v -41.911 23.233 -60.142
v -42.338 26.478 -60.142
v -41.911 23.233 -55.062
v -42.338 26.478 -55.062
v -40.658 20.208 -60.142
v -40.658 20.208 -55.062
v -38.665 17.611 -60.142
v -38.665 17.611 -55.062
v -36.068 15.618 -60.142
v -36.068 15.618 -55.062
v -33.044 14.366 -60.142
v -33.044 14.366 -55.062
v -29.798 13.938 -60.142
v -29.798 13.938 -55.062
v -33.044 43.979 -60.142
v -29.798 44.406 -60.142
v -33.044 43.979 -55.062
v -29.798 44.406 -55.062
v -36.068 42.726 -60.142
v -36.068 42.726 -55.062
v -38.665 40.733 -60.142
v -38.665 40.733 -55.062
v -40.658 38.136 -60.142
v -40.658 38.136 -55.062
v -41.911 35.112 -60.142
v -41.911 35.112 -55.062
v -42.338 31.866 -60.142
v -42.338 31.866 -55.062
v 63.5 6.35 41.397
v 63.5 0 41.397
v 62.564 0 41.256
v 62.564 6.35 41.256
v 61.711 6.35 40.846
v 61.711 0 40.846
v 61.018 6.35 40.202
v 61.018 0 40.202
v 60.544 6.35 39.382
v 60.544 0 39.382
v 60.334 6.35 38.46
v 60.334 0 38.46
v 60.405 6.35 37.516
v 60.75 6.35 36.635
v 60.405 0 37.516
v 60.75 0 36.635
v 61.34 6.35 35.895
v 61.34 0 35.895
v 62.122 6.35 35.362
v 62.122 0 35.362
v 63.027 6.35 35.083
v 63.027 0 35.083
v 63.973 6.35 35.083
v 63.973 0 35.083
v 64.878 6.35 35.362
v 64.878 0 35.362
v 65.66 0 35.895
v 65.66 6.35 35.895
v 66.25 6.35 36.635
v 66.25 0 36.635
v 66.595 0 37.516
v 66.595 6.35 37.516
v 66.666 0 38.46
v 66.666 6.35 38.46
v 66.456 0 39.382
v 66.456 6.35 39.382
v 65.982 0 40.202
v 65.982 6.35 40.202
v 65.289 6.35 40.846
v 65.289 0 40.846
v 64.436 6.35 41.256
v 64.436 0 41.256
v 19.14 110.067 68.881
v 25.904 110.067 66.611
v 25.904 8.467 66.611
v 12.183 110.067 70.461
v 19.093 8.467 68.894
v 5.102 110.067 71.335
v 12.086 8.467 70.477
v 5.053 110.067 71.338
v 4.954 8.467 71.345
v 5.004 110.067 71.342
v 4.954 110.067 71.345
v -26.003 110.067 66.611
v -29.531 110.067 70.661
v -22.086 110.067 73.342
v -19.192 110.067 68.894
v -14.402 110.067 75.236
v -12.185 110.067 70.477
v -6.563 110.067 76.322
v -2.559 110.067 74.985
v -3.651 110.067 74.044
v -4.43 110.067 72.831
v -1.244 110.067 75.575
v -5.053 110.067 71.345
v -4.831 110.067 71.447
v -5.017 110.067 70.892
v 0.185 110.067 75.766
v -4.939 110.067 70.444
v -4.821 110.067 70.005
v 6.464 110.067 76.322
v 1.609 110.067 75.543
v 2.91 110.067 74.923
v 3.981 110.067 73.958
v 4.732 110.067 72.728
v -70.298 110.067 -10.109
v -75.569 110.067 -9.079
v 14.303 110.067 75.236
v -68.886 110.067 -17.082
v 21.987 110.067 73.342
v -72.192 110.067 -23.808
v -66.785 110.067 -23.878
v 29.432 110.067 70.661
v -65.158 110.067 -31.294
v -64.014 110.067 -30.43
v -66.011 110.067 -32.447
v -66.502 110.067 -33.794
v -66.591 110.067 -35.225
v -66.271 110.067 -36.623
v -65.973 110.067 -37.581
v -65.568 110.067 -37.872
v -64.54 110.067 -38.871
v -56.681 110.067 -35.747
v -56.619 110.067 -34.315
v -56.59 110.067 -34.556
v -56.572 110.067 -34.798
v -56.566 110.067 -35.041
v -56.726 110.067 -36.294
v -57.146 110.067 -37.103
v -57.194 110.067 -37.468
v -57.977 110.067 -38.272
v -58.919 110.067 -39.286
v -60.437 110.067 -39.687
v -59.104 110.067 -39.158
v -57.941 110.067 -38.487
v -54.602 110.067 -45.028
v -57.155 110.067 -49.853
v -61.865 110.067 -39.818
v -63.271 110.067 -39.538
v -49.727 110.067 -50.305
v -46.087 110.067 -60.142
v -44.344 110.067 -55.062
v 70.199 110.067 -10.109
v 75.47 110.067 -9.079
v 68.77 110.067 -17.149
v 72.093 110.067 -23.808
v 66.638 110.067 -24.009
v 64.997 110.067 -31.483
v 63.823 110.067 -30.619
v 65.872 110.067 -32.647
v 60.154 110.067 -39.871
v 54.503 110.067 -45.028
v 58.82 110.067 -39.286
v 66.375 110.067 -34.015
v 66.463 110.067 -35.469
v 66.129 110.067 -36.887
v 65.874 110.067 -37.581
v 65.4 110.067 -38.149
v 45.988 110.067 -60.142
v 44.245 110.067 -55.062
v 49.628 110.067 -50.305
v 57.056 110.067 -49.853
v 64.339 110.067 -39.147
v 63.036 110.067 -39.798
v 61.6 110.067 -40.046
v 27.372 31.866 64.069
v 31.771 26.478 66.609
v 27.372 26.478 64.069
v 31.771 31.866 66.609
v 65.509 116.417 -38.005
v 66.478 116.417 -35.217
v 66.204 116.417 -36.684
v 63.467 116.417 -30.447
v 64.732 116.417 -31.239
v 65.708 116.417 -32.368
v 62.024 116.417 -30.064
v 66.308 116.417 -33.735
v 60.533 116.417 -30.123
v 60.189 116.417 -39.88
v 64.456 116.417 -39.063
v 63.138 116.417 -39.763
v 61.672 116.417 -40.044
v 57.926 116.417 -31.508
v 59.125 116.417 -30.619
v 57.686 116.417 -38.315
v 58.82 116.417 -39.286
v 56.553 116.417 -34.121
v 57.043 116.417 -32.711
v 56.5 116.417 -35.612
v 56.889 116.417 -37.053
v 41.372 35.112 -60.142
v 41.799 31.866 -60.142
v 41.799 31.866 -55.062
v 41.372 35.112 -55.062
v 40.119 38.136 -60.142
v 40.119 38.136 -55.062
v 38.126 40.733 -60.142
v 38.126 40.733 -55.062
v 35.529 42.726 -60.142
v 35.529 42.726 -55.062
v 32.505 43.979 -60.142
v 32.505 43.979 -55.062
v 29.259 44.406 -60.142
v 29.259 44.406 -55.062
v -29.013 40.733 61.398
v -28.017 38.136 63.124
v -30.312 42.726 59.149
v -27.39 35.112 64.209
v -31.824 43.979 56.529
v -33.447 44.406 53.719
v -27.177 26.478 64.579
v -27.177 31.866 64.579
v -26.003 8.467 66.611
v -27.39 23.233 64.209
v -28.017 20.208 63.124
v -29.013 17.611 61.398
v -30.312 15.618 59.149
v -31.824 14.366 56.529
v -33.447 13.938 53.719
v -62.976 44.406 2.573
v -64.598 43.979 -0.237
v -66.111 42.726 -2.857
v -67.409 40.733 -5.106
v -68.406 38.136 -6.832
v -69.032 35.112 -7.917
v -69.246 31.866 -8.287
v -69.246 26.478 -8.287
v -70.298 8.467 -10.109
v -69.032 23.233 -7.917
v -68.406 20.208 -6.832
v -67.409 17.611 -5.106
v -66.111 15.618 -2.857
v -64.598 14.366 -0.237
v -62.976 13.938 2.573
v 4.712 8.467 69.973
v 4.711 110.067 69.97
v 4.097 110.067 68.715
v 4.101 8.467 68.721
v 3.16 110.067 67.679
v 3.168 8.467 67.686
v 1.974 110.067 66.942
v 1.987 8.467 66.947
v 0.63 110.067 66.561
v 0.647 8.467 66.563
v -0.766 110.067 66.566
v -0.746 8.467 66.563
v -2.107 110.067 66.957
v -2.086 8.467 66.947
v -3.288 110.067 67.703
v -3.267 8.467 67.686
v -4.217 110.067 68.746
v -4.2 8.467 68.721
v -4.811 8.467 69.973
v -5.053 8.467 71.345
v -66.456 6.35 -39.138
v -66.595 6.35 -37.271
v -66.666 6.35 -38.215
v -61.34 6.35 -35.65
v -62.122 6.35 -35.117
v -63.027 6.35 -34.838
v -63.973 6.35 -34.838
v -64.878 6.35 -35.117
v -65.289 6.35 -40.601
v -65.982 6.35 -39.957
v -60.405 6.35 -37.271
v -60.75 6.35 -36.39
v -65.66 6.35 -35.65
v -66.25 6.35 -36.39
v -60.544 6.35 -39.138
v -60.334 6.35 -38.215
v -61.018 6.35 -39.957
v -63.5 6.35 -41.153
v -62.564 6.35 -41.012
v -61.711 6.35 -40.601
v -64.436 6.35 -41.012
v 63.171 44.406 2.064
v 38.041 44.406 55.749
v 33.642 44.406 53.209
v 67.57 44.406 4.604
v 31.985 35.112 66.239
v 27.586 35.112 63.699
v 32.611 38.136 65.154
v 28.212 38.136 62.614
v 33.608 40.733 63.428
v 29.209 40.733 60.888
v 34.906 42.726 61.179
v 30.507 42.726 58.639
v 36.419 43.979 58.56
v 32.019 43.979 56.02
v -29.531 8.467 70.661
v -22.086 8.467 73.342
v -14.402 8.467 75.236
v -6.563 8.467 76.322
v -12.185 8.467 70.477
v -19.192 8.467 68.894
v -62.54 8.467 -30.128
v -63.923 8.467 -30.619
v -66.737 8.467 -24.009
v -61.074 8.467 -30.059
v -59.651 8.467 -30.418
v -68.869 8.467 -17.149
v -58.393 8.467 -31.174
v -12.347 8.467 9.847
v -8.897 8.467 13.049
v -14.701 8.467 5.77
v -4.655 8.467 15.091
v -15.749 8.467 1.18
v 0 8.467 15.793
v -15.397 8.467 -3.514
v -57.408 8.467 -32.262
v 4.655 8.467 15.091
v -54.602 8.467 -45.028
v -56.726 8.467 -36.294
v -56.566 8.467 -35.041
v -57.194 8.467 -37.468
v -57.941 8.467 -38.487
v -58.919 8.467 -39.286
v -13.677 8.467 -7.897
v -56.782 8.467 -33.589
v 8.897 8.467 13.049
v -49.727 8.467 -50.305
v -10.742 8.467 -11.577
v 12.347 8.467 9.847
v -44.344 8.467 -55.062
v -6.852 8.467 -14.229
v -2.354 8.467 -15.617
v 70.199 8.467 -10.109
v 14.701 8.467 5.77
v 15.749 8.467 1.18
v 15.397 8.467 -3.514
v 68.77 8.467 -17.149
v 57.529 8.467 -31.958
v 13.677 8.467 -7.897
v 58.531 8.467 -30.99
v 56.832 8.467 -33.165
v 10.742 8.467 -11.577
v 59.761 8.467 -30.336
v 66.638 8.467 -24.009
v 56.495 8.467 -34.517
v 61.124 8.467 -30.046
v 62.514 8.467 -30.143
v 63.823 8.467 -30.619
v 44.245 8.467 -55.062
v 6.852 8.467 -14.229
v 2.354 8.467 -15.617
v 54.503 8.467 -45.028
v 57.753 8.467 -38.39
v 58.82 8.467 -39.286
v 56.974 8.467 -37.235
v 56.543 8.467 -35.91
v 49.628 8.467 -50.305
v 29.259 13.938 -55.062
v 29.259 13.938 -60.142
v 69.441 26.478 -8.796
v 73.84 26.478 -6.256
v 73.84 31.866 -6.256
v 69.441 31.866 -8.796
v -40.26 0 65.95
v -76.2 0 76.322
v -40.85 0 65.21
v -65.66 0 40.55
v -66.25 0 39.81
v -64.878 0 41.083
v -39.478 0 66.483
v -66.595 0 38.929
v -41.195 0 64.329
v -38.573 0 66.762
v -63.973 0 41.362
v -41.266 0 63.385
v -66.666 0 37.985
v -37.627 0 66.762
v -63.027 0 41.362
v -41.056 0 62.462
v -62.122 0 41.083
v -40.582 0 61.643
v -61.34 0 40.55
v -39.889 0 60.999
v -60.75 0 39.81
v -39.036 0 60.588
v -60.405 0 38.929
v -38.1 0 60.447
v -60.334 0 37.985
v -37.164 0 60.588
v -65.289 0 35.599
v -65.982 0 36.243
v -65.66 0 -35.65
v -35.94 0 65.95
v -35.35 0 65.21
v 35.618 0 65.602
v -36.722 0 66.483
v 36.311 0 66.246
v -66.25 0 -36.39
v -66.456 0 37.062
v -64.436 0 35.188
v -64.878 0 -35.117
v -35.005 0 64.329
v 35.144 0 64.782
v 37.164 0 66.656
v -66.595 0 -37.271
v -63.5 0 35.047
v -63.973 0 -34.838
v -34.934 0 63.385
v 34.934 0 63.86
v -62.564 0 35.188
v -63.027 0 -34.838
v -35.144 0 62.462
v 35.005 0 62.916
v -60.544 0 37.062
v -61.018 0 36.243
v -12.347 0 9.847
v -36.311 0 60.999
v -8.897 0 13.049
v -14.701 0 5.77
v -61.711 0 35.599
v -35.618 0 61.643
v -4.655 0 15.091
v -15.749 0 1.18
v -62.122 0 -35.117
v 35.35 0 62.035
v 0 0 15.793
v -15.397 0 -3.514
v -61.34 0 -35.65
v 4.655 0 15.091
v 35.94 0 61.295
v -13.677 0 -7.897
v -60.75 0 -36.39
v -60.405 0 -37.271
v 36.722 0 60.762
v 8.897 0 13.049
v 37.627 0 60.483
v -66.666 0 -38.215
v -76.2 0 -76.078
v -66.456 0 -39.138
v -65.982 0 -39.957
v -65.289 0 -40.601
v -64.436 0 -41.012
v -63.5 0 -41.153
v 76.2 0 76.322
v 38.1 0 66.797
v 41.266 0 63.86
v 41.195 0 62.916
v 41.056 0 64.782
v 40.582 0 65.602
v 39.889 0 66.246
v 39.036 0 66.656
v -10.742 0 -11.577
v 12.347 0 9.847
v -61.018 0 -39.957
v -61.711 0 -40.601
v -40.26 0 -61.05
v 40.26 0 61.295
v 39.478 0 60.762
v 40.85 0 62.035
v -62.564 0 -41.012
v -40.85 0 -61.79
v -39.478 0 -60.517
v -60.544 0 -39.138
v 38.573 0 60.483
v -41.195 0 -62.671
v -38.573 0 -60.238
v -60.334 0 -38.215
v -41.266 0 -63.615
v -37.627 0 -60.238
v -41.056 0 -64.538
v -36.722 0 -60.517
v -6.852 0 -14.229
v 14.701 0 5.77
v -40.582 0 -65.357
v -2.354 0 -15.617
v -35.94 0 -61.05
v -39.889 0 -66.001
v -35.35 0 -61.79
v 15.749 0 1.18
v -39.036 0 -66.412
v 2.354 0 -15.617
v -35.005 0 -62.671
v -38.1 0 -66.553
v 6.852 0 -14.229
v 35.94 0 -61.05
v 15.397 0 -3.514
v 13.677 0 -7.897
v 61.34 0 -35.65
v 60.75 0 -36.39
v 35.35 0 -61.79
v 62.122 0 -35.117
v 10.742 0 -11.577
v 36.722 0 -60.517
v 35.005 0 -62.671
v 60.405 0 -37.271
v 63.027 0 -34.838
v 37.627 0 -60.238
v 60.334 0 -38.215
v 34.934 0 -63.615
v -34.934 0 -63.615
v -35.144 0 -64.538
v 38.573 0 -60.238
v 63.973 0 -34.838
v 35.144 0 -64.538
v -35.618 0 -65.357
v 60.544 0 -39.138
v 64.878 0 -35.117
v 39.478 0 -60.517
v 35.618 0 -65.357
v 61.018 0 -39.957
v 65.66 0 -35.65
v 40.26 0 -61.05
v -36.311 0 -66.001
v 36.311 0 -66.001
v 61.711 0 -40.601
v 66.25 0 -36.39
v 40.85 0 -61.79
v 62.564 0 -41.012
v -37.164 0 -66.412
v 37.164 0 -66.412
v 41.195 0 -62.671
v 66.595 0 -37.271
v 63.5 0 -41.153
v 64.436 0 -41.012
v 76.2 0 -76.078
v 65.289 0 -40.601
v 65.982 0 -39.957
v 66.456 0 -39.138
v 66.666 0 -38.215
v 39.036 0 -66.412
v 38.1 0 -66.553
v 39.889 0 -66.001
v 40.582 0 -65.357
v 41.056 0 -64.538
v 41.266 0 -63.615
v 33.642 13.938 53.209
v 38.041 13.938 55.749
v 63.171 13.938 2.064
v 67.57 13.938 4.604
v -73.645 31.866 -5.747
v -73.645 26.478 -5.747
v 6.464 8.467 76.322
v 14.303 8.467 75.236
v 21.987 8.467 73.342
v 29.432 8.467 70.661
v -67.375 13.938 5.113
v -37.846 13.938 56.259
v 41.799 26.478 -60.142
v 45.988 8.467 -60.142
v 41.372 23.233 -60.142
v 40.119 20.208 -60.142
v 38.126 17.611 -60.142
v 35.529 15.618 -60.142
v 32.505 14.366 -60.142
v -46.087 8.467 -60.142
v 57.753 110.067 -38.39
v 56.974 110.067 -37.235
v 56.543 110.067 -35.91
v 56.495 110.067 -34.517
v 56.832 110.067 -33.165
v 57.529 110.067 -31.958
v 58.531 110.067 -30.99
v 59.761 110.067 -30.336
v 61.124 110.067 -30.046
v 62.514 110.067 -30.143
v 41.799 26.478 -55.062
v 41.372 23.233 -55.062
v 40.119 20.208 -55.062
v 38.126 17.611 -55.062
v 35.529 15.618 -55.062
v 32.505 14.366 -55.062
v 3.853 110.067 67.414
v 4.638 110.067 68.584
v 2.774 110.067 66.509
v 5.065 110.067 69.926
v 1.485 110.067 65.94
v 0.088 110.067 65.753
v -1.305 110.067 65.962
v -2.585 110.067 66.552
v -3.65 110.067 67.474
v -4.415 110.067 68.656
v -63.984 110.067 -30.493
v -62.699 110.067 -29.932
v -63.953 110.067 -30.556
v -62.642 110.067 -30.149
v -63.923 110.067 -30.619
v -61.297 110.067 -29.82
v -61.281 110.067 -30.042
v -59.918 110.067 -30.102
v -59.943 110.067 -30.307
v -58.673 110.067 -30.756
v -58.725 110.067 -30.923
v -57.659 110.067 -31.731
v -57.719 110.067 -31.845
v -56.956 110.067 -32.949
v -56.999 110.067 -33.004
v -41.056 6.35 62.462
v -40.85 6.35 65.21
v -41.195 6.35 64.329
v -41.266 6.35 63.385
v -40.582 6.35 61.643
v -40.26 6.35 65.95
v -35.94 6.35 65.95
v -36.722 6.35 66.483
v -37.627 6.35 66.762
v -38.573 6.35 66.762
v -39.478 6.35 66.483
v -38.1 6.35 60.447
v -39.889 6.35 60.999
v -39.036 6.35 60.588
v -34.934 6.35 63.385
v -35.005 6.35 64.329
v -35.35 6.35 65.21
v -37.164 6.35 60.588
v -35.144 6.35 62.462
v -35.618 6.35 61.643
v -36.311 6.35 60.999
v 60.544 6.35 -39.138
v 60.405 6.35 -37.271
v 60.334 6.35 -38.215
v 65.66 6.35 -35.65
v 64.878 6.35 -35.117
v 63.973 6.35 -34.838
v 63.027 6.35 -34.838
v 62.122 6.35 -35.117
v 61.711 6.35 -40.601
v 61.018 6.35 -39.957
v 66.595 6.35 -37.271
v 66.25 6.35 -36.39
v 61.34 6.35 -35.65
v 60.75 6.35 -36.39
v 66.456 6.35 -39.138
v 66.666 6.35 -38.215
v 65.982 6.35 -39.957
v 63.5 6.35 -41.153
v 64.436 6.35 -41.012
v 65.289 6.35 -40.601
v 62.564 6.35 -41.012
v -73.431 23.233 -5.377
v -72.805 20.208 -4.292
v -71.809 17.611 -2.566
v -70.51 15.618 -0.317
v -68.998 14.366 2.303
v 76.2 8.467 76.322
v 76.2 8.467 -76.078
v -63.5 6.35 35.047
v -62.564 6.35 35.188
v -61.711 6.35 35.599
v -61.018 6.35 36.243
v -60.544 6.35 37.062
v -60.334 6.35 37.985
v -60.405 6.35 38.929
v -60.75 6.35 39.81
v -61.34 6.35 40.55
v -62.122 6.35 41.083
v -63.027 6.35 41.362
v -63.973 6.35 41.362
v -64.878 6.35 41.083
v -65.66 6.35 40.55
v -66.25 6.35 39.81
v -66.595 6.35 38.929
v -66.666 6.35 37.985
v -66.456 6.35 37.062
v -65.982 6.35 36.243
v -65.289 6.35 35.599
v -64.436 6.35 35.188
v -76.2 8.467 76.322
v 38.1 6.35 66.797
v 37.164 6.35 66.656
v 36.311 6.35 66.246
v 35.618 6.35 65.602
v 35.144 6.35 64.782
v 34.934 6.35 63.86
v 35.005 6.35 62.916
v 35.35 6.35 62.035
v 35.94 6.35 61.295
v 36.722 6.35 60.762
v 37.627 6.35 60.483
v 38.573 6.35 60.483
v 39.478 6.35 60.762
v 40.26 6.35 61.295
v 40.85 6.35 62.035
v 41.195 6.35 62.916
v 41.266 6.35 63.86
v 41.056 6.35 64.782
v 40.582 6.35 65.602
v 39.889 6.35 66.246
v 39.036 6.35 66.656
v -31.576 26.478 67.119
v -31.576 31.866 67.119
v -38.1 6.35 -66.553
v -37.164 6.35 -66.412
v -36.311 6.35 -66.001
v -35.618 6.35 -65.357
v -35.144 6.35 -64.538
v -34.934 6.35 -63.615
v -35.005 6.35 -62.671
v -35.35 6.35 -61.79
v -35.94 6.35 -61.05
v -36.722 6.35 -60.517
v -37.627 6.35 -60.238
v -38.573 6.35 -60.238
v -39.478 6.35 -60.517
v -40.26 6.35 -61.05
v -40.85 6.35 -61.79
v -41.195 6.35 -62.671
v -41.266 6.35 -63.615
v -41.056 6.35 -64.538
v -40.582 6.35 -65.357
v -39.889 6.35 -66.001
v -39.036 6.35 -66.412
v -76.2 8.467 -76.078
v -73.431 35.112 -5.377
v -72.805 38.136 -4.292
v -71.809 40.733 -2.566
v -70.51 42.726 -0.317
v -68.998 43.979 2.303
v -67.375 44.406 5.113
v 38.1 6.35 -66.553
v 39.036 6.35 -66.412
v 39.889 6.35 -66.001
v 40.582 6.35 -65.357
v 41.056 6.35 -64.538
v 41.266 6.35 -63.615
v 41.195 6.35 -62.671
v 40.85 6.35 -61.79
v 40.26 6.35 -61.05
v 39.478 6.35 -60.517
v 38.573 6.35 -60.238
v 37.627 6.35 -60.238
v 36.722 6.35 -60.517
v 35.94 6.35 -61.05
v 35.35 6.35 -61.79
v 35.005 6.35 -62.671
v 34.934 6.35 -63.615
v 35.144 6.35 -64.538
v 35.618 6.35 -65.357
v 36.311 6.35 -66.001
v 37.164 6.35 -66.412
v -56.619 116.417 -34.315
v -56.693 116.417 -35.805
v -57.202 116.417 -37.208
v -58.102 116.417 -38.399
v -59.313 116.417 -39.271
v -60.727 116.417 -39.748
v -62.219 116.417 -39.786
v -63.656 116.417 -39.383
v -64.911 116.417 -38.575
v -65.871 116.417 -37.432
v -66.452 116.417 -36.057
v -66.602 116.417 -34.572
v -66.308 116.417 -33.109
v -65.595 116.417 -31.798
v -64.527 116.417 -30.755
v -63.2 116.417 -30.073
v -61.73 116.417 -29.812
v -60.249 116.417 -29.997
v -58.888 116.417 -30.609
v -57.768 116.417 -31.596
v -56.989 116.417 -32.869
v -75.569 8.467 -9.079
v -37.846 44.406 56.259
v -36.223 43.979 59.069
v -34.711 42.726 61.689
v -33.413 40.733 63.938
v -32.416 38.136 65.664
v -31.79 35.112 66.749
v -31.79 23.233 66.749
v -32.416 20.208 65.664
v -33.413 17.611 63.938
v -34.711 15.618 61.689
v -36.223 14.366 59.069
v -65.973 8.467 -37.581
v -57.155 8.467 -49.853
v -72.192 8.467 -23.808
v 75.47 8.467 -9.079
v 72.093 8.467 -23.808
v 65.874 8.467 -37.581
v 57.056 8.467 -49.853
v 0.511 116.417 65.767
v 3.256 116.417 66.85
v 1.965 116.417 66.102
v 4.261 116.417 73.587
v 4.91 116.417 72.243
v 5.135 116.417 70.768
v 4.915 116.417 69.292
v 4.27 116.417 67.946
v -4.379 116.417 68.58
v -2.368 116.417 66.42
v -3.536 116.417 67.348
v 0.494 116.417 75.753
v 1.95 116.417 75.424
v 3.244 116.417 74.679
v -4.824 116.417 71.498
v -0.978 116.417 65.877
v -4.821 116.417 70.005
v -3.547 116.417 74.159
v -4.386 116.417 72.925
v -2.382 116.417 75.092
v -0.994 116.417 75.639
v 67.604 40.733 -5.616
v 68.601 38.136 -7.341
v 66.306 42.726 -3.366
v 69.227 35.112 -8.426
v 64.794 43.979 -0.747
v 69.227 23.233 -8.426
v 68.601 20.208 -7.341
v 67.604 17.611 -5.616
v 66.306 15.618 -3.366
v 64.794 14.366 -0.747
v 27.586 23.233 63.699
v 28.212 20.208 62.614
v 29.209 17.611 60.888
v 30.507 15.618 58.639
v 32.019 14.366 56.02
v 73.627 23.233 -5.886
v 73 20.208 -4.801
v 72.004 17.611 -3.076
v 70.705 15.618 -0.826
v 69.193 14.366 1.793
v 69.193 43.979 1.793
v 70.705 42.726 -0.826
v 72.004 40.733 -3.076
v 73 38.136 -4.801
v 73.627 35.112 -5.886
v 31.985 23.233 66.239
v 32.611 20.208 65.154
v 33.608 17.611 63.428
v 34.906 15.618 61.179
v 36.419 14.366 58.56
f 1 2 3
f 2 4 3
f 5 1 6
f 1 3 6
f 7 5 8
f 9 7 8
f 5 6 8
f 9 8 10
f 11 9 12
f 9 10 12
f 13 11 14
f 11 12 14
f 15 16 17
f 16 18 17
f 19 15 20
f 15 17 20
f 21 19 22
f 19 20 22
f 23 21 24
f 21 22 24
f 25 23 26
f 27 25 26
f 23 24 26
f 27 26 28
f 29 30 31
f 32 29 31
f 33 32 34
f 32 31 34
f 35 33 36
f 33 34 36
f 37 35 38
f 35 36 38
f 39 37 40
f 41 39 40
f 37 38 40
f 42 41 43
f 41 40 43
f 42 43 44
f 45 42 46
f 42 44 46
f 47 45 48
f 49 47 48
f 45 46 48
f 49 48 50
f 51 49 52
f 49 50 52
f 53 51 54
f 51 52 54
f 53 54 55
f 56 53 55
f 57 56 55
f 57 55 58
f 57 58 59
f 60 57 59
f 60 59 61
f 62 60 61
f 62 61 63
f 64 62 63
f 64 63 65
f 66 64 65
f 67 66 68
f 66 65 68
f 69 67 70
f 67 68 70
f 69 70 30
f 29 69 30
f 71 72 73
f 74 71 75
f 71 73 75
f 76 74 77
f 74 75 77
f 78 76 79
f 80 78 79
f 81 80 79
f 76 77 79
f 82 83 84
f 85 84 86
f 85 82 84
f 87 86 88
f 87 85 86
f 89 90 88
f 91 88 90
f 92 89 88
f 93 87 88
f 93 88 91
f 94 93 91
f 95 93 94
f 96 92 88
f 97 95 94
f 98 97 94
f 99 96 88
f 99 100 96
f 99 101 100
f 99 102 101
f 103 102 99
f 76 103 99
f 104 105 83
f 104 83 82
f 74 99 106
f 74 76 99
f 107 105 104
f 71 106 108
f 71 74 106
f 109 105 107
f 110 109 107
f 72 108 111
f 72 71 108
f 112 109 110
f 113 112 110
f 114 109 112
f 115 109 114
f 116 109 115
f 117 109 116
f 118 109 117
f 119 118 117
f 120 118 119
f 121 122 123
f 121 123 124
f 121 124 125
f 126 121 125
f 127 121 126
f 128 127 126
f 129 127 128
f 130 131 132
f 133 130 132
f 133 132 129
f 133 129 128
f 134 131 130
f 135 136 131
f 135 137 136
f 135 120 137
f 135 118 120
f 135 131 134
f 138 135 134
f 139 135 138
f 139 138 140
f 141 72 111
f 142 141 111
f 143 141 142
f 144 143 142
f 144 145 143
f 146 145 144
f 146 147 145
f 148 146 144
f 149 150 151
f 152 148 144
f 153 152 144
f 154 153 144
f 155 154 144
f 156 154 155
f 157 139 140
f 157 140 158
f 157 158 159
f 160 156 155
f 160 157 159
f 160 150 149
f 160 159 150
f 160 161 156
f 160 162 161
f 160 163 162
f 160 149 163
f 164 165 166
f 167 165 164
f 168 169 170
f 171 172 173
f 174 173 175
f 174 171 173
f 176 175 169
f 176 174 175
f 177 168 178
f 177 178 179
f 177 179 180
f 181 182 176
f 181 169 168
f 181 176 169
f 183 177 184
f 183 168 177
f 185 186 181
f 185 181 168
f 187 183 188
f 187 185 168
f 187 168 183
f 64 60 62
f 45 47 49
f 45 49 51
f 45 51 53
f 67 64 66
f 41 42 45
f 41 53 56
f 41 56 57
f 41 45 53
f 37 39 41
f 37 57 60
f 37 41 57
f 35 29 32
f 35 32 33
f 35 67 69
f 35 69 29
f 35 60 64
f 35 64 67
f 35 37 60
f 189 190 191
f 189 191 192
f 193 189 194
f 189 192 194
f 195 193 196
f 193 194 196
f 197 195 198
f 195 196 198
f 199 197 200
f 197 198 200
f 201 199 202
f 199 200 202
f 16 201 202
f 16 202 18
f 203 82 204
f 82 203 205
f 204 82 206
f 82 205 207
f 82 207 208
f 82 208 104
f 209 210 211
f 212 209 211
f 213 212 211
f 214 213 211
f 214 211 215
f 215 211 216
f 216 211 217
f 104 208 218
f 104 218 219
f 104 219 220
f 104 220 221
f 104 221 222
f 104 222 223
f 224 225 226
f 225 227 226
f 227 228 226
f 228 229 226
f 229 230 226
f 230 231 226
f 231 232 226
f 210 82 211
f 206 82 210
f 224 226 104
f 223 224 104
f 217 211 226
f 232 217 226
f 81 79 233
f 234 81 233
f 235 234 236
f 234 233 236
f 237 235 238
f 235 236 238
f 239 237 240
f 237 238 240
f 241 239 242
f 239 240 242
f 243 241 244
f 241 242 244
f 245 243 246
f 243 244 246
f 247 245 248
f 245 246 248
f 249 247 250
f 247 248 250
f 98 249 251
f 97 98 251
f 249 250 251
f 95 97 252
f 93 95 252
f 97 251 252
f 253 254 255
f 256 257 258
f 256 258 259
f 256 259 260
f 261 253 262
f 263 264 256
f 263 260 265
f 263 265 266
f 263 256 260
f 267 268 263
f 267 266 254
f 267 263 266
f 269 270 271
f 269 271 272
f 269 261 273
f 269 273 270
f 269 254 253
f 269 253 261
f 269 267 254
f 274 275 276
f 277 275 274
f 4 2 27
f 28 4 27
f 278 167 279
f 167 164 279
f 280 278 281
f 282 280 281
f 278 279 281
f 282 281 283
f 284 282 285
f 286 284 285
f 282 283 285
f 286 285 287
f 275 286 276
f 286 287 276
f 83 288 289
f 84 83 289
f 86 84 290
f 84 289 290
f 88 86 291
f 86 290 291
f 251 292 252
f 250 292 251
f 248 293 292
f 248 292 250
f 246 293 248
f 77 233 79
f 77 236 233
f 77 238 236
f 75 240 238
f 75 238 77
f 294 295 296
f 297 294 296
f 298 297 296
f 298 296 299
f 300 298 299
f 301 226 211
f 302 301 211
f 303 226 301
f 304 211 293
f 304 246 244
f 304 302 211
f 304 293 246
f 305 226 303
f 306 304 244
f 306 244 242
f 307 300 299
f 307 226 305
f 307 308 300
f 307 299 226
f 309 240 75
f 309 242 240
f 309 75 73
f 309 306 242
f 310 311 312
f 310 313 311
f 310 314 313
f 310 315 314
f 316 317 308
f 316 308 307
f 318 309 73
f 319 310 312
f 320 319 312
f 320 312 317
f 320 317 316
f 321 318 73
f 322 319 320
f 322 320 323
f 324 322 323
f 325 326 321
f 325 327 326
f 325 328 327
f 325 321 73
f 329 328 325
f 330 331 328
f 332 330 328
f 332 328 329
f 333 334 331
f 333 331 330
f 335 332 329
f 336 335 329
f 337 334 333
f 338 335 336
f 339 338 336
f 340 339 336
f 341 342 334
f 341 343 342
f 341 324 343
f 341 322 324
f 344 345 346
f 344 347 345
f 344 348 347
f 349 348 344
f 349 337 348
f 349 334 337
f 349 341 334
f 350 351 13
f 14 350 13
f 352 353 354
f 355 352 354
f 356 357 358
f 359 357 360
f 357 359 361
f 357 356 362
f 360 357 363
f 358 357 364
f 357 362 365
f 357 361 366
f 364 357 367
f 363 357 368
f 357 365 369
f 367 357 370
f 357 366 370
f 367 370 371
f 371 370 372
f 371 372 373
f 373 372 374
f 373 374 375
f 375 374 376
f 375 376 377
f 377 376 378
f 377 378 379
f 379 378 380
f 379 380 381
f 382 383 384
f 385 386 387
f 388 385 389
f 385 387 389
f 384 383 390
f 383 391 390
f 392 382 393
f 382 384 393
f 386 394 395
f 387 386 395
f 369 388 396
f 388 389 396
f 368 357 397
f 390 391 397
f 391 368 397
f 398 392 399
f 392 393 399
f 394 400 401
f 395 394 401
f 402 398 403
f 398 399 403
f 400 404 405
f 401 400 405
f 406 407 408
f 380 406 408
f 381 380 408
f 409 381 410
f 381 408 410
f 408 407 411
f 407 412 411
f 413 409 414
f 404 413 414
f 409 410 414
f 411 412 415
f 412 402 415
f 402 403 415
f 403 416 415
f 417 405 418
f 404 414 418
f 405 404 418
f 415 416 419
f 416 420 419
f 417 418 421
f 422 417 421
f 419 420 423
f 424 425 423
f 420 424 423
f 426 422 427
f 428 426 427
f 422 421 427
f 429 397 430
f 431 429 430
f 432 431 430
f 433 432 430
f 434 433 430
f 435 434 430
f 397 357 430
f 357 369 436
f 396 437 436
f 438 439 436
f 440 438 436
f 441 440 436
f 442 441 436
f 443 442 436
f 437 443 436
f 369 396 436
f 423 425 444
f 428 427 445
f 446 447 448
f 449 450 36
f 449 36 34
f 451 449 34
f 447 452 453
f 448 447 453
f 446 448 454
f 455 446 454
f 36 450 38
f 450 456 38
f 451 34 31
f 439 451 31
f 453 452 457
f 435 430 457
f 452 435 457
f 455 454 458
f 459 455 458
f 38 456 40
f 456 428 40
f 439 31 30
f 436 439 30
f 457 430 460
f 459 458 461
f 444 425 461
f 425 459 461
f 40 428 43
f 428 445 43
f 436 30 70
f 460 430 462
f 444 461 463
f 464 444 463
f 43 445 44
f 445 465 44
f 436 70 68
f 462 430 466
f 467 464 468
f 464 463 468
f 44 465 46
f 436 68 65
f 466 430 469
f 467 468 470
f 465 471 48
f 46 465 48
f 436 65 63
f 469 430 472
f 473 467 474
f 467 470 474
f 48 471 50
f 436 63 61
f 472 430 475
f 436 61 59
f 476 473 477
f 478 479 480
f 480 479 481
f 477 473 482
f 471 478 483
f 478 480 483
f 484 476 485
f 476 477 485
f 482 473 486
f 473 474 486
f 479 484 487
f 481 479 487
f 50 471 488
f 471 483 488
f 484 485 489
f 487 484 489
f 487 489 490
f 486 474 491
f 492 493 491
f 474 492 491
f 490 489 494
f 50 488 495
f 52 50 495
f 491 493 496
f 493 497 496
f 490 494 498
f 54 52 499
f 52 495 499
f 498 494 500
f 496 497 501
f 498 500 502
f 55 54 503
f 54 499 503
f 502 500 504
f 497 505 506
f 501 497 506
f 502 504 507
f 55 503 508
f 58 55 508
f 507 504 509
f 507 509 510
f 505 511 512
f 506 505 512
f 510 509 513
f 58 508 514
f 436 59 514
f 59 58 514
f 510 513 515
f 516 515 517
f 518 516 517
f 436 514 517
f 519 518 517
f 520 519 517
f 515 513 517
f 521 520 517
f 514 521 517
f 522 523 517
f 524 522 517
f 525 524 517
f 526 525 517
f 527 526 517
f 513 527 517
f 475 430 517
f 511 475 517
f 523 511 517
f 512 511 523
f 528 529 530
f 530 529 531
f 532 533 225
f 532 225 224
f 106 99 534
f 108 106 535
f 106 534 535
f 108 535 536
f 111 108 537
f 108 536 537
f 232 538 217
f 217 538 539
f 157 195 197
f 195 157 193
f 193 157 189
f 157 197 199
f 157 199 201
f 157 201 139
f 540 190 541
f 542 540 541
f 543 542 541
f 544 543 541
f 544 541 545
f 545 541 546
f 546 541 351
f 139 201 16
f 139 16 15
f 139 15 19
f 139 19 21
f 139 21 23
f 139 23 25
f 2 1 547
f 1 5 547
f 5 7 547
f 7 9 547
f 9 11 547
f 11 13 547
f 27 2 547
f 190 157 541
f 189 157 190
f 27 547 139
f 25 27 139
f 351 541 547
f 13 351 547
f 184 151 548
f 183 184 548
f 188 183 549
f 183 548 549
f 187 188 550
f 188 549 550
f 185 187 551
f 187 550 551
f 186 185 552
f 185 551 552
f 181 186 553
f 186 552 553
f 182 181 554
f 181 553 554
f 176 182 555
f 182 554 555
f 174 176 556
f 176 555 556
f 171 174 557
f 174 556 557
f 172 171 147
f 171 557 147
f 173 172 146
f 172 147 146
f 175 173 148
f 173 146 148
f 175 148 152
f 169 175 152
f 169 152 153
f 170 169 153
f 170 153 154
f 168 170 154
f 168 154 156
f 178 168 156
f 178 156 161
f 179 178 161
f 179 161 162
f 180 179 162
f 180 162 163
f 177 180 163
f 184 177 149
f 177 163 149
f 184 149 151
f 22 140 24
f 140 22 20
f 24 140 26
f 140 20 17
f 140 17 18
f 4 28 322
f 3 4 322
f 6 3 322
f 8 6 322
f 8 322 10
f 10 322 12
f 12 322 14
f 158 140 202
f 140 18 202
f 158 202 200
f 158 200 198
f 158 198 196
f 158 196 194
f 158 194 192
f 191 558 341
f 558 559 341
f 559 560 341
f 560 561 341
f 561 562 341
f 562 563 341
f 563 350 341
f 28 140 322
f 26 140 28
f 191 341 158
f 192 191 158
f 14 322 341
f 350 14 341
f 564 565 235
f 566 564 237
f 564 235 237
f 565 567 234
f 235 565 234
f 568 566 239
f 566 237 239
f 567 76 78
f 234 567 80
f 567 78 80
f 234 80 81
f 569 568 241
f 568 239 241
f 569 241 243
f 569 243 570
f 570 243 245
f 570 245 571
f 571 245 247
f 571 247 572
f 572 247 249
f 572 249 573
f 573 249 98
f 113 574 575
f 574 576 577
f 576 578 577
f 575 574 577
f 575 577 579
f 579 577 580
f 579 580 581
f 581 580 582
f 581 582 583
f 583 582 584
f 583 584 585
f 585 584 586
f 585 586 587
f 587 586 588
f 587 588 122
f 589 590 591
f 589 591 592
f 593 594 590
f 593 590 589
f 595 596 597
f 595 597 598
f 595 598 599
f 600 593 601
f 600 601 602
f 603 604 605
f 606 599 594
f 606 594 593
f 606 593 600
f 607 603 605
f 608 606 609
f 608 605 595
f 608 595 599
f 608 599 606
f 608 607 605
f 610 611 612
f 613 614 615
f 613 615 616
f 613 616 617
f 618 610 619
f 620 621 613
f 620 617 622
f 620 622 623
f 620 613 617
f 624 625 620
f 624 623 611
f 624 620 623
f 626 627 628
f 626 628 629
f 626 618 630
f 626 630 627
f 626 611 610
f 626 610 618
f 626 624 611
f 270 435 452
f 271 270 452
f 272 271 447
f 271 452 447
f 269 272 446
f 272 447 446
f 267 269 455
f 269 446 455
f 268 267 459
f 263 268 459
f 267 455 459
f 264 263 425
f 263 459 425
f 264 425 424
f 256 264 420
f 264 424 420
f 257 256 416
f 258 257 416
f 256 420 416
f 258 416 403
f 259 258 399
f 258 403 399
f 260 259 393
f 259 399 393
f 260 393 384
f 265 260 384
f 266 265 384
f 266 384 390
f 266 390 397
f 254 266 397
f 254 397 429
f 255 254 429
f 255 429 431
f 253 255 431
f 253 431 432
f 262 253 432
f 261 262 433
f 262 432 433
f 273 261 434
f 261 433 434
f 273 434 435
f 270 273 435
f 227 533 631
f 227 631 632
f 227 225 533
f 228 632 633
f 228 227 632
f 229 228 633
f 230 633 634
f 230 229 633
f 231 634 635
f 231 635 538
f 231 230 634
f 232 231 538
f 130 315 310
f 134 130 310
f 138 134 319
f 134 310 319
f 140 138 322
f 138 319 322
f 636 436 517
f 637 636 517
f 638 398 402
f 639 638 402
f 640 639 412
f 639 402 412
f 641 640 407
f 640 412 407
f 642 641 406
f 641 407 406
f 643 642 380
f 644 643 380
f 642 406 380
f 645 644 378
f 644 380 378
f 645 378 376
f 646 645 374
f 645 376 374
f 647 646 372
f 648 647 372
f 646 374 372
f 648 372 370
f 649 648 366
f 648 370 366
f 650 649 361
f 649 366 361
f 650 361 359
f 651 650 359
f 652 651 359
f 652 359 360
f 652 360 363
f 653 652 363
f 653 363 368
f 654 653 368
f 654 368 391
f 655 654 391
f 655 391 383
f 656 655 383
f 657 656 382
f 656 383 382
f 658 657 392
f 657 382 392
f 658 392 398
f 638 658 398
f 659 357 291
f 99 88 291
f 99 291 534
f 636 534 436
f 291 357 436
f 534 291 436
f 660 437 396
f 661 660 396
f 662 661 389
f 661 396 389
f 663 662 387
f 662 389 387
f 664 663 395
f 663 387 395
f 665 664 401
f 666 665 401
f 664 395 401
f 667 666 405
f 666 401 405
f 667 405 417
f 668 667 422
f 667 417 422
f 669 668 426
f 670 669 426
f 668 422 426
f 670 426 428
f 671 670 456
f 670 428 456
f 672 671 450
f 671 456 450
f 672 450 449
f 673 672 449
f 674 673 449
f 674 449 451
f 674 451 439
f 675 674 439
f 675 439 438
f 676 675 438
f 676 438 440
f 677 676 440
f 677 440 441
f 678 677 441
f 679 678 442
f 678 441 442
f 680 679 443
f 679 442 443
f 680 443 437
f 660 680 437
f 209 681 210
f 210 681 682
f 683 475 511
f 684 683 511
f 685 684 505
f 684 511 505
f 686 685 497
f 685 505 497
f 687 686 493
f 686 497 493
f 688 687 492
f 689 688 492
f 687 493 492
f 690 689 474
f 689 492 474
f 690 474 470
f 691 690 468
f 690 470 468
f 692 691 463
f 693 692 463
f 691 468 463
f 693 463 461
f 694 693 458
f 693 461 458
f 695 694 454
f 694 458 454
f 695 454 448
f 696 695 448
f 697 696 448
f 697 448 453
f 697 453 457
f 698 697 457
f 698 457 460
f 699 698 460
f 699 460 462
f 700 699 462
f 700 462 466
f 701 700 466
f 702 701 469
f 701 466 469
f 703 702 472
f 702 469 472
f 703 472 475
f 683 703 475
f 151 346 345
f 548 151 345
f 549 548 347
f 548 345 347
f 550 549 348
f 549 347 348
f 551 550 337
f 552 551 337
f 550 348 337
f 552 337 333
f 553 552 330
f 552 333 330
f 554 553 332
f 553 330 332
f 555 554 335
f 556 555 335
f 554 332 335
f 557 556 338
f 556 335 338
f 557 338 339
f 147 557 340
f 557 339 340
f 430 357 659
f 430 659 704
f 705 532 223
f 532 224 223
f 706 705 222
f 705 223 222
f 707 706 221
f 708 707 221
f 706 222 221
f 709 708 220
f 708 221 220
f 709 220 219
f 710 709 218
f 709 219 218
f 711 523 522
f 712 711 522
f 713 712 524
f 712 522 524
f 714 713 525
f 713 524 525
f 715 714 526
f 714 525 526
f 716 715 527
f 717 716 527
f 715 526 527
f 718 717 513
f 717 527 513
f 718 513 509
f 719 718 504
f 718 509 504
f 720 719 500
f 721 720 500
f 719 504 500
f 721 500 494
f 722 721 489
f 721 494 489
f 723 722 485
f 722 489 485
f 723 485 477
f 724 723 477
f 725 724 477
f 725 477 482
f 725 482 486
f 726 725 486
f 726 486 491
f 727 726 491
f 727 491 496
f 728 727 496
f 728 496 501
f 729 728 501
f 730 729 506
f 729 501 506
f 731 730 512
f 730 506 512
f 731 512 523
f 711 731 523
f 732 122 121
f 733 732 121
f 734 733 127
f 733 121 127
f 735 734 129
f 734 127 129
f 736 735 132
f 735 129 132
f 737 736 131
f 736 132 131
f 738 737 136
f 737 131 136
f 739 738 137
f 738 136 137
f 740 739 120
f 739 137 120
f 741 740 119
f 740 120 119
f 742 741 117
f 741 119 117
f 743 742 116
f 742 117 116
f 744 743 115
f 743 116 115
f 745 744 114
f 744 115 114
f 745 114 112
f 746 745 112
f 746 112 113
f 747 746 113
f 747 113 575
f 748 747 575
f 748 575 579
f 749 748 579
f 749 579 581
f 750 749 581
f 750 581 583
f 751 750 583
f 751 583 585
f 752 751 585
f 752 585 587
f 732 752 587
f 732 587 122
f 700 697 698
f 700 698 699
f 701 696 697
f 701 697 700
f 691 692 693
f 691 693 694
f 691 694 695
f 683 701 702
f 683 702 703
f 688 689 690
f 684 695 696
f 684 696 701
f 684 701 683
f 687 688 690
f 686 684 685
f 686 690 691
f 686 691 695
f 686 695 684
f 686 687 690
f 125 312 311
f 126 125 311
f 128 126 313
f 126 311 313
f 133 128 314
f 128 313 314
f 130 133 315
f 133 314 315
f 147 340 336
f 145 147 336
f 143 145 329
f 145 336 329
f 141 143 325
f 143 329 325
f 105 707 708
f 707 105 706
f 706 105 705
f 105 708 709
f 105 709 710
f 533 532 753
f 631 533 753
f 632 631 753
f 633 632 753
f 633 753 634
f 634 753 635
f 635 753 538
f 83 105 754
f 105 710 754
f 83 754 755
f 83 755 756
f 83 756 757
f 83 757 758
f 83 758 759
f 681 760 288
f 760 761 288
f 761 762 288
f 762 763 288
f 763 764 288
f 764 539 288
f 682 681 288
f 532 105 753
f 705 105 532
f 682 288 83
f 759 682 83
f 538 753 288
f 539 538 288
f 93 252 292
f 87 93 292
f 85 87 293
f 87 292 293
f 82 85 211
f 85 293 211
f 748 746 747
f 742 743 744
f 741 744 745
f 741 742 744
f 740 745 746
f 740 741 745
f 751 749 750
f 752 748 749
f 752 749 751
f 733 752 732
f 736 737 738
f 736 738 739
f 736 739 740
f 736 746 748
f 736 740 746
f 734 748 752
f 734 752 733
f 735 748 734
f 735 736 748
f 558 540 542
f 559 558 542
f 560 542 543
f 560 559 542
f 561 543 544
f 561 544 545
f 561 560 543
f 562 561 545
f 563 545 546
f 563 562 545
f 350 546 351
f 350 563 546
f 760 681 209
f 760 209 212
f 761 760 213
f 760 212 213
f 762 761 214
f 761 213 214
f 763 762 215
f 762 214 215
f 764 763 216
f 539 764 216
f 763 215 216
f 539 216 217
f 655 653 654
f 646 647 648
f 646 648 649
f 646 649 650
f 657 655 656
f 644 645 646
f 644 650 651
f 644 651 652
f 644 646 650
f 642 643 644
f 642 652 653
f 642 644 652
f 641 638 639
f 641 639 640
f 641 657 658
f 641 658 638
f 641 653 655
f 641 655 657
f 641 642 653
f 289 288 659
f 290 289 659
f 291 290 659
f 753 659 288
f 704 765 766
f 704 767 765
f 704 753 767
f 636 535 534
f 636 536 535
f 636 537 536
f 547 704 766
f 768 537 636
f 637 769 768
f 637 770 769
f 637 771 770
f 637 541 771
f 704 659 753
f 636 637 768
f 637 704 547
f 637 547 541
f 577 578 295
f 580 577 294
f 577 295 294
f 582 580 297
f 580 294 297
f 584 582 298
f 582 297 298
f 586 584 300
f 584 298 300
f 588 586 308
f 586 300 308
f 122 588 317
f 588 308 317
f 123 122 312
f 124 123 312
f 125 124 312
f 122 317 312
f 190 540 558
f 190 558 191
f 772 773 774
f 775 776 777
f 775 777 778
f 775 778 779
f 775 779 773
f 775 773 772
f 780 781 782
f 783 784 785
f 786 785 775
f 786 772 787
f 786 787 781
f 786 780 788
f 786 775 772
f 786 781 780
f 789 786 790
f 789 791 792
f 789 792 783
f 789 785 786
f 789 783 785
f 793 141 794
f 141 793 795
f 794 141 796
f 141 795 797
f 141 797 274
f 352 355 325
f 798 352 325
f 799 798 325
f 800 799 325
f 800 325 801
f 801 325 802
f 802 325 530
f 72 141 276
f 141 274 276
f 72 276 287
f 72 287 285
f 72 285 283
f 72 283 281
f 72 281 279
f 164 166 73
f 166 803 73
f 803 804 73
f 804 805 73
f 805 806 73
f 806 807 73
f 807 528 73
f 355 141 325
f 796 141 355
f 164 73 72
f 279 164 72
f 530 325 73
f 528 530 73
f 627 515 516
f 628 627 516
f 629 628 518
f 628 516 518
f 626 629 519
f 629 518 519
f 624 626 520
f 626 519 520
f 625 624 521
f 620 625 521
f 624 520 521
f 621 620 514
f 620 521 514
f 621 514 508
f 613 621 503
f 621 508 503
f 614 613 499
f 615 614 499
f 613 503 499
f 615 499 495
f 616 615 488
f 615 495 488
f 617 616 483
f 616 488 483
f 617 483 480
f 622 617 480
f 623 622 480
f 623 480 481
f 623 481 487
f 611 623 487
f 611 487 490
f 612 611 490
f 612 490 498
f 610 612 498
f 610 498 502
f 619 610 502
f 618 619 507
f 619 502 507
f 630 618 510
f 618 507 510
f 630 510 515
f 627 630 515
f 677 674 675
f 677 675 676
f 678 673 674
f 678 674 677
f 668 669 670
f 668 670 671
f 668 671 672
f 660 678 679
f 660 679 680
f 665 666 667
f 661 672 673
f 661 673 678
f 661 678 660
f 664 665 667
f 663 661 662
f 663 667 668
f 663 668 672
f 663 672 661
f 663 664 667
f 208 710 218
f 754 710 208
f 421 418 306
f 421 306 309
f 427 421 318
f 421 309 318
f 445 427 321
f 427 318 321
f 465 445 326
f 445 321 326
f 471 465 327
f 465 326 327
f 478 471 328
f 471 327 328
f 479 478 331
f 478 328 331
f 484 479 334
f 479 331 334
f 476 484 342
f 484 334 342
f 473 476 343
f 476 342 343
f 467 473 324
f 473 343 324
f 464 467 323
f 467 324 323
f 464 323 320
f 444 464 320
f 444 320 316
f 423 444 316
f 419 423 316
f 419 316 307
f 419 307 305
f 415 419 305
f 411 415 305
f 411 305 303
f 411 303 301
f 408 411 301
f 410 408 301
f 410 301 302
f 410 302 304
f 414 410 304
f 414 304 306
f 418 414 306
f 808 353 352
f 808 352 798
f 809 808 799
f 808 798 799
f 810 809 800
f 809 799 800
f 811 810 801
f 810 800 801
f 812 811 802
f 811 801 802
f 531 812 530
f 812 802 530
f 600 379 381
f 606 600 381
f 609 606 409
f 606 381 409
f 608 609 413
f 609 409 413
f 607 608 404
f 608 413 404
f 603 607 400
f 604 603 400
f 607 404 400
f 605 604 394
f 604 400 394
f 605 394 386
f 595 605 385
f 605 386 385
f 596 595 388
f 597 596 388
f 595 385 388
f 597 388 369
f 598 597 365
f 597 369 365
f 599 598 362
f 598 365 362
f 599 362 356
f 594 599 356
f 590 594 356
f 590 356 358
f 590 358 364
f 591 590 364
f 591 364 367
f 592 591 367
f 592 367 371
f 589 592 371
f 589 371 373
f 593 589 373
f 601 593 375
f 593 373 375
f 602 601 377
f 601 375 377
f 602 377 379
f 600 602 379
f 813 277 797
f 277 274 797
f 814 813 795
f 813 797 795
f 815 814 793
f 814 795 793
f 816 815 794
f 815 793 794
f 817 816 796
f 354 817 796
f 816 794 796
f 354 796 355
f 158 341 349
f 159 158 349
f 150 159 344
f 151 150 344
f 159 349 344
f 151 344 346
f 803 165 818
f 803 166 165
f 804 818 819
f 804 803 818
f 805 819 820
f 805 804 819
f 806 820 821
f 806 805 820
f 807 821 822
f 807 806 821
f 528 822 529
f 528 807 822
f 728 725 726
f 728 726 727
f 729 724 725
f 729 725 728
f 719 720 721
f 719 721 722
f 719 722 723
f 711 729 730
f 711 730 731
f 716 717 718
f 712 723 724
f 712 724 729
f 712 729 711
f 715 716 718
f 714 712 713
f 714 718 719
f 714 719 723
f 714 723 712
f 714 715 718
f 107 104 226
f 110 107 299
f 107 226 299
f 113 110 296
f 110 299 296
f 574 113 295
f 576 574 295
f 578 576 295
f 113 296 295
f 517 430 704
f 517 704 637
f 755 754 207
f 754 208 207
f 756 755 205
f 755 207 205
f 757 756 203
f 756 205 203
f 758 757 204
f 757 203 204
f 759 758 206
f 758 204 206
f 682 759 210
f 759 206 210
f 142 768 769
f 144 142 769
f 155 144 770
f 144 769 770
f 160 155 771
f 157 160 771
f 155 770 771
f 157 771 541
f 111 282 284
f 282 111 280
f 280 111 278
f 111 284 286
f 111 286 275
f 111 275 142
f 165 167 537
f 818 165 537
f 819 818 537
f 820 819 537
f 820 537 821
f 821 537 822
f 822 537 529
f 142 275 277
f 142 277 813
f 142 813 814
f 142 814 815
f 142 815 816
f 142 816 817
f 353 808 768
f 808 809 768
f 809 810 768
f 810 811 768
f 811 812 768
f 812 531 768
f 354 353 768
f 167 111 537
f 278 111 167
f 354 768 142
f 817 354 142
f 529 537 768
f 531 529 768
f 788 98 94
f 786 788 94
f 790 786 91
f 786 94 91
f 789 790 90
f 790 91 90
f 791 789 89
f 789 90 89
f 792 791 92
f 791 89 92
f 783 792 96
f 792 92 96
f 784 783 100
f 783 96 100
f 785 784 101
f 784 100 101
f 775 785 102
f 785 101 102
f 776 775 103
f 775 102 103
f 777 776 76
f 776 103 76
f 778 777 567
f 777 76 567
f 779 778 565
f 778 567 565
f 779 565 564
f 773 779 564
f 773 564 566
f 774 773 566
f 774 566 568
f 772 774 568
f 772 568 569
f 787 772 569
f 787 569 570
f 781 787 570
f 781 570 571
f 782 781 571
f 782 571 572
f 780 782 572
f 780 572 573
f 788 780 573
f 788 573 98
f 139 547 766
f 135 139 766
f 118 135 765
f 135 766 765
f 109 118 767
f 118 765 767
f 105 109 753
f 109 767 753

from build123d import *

# Parameters (mm, degrees)
SKETCH1_W                = 152.4
SKETCH1_H                = 152.4
BOSS_EXTRUDE1_DEPTH      = 8.466666667
BOSS_EXTRUDE3_DEPTH      = 101.6
SKETCH4_R                = 5.006944118
BOSS_EXTRUDE4_DEPTH      = 6.35
CUT_EXTRUDE1_REACH       = 205.785
SKETCH6_W                = 84.1375
SKETCH6_H                = 30.46777391
FILLET1_R                = 12.54
CIRPATTERN3_COUNT        = 3
FILLET1_OF_CIRPATTERN3_R = 12.54
SKETCH8_R                = 3.175
CUT_EXTRUDE2_DEPTH       = 6.35
SKETCH9_R                = 15.793040305
CUT_EXTRUDE4_DEPTH       = 153.593412515


with BuildPart() as part:
    # Sketch1 → Boss-Extrude1 (new body)
    with BuildSketch(Plane(origin=(0, 0, 0), x_dir=(1, 0, 0), z_dir=(0, 1, 0))):
        with Locations((0, -0.122388871)):
            Rectangle(SKETCH1_W, SKETCH1_H)
    extrude(amount=BOSS_EXTRUDE1_DEPTH)

    # Sketch3 → Boss-Extrude3 (add)
    with BuildSketch(Plane(origin=(0, 8.466666667, 0), x_dir=(1, 0, 0), z_dir=(0, 1, 0))):
        with BuildLine():
            ThreePointArc((-58.918716059, 39.286110084), (-65.909577408, 37.544355622), (-63.922550345, 30.619214868))
            ThreePointArc((-63.922550345, 30.619214868), (-61.573436607, 35.040883563), (-58.918716059, 39.286110084))
        make_face()
        with BuildLine():
            ThreePointArc((-58.918716059, 39.286110084), (-61.573436607, 35.040883563), (-63.922550345, 30.619214868))
            ThreePointArc((-63.922550345, 30.619214868), (-58.993939739, 30.749533507), (-56.566492489, 35.040883563))
            ThreePointArc((-56.566492489, 35.040883563), (-57.193851762, 37.467553294), (-58.918716059, 39.286110084))
        make_face()
        with BuildLine():
            Line((45.987944587, 60.142290401), (-46.087055413, 60.142290401))
            ThreePointArc((-46.087055413, 60.142290401), (-65.972845658, 37.580883563), (-75.568702003, 9.078580617))
            Line((-75.568702003, 9.078580617), (-29.531202003, -70.660708437))
            ThreePointArc((-29.531202003, -70.660708437), (-18.268592558, -74.38917131), (-6.563445111, -76.322388871))
            Line((-6.563445111, -76.322388871), (-1.471511547, -76.322388871))
            ThreePointArc((-1.471511547, -76.322388871), (-4.113530257, -74.446258004), (-5.053389698, -71.345162371))
            ThreePointArc((-5.053389698, -71.345162371), (-15.708360105, -69.77438362), (-26.003436632, -66.610977296))
            Line((-26.003436632, -66.610977296), (-70.297649271, 10.108849476))
            ThreePointArc((-70.297649271, 10.108849476), (-67.889701246, 20.606350444), (-63.922550345, 30.619214868))
            ThreePointArc((-63.922550345, 30.619214868), (-65.909577408, 37.544355622), (-58.918716059, 39.286110084))
            ThreePointArc((-58.918716059, 39.286110084), (-52.230896554, 47.728195757), (-44.343768052, 55.062290401))
            Line((-44.343768052, 55.062290401), (44.244657227, 55.062290401))
            ThreePointArc((44.244657227, 55.062290401), (52.131785728, 47.728195757), (58.819605234, 39.286110084))
            ThreePointArc((58.819605234, 39.286110084), (63.900995513, 39.420468408), (66.481269899, 35.040883563))
            ThreePointArc((66.481269899, 35.040883563), (65.765675838, 32.461386695), (63.823439519, 30.619214868))
            ThreePointArc((63.823439519, 30.619214868), (67.790590421, 20.606350444), (70.198538446, 10.108849476))
            Line((70.198538446, 10.108849476), (25.904325806, -66.610977296))
            ThreePointArc((25.904325806, -66.610977296), (15.60924928, -69.77438362), (4.954278873, -71.345162371))
            ThreePointArc((4.954278873, -71.345162371), (4.956611187, -71.433369756), (4.957388705, -71.521604544))
            ThreePointArc((4.957388705, -71.521604544), (3.962248689, -74.517421169), (1.372400721, -76.322388871))
            Line((1.372400721, -76.322388871), (6.464334286, -76.322388871))
            ThreePointArc((6.464334286, -76.322388871), (18.169481733, -74.38917131), (29.432091177, -70.660708437))
            Line((29.432091177, -70.660708437), (75.469591177, 9.078580617))
            ThreePointArc((75.469591177, 9.078580617), (65.873734833, 37.580883563), (45.987944587, 60.142290401))
        make_face()
        with BuildLine():
            ThreePointArc((4.954278873, -71.345162371), (-0.049555413, -66.514660427), (-5.053389698, -71.345162371))
            ThreePointArc((-5.053389698, -71.345162371), (-0.049555413, -71.521604544), (4.954278873, -71.345162371))
        make_face()
        with BuildLine():
            ThreePointArc((-5.053389698, -71.345162371), (-4.113530257, -74.446258004), (-1.471511547, -76.322388871))
            Line((-1.471511547, -76.322388871), (1.372400721, -76.322388871))
            ThreePointArc((1.372400721, -76.322388871), (3.962248689, -74.517421169), (4.957388705, -71.521604544))
            ThreePointArc((4.957388705, -71.521604544), (4.956611187, -71.433369756), (4.954278873, -71.345162371))
            ThreePointArc((4.954278873, -71.345162371), (-0.049555413, -71.521604544), (-5.053389698, -71.345162371))
        make_face()
        with BuildLine():
            ThreePointArc((58.819605234, 39.286110084), (57.13818498, 32.537411504), (63.823439519, 30.619214868))
            ThreePointArc((63.823439519, 30.619214868), (61.474325782, 35.040883563), (58.819605234, 39.286110084))
        make_face()
        with BuildLine():
            ThreePointArc((58.819605234, 39.286110084), (61.474325782, 35.040883563), (63.823439519, 30.619214868))
            ThreePointArc((63.823439519, 30.619214868), (65.765675838, 32.461386695), (66.481269899, 35.040883563))
            ThreePointArc((66.481269899, 35.040883563), (63.900995513, 39.420468408), (58.819605234, 39.286110084))
        make_face()
    extrude(amount=BOSS_EXTRUDE3_DEPTH)

    # Sketch4 → Boss-Extrude4 (add)
    with BuildSketch(Plane(origin=(0, 110.066666667, 0), x_dir=(1, 0, 0), z_dir=(0, 1, 0))):
        with Locations(Location((61.474325782, 35.040883563, 0), (0, 0, 122.019492362))):
            Circle(SKETCH4_R)
        with Locations(Location((0.128367161, -70.759732709, 0), (0, 0, 171.336111326))):
            Circle(SKETCH4_R)
        with Locations(Location((-61.601057978, 34.817609153, 0), (0, 0, 354.23508657))):
            Circle(SKETCH4_R)
    extrude(amount=BOSS_EXTRUDE4_DEPTH)

    # Sketch6 → Cut-Extrude1 (cut, up to next)
    with BuildSketch(Plane(origin=(-52.74538578, 0, 30.452562679), x_dir=(0.5, 0, 0.8660254037844386), z_dir=(-0.8660254037844387, 0, 0.5000000000000001)), mode=Mode.PRIVATE) as cut_extrude1_sk1:
        with Locations((0.269593494, 29.172106293)):
            Rectangle(SKETCH6_W, SKETCH6_H)
    cut_extrude1_tool1 = extrude(cut_extrude1_sk1.sketch, amount=-CUT_EXTRUDE1_REACH, mode=Mode.PRIVATE) & part.part
    cut_extrude1 = cut_extrude1_tool1.solids().sort_by_distance((-52.610589, 29.172106, 30.686037))[0]
    add(cut_extrude1, mode=Mode.SUBTRACT)

    # Fillet1
    fillet1_edges = [part.edges().sort_by_distance(p)[0] for p in [
        (-29.376509507, 44.405993248, 65.848643698),
        (-29.376509507, 13.938219338, 65.848643698),
        (-71.445259507, 13.938219338, -7.016568713),
        (-71.445259507, 44.405993248, -7.016568713),
    ]]
    fillet(fillet1_edges, radius=FILLET1_R)

    # CirPattern3: Cut-Extrude1; each copy of Cut-Extrude1 runs up to whatever stops it at its own place
    cirpattern3_before = part.part  # the part as the pattern finds it: every copy runs up to it
    cirpattern3_cut_extrude1_long = extrude(cut_extrude1_sk1.sketch, amount=-CUT_EXTRUDE1_REACH, mode=Mode.PRIVATE)
    cirpattern3_cut_extrude1_tool1 = cirpattern3_cut_extrude1_long.rotate(Axis((0, 0, 0), (0, 1, 0)), 1 * 360 / CIRPATTERN3_COUNT) & cirpattern3_before
    add(cirpattern3_cut_extrude1_tool1.solids().sort_by_distance((52.880182, 29.172106, 30.219088))[0], mode=Mode.SUBTRACT)
    cirpattern3_cut_extrude1_tool2 = cirpattern3_cut_extrude1_long.rotate(Axis((0, 0, 0), (0, 1, 0)), 2 * 360 / CIRPATTERN3_COUNT) & cirpattern3_before
    add(cirpattern3_cut_extrude1_tool2.solids().sort_by_distance((-0.269593, 29.172106, -60.905125))[0], mode=Mode.SUBTRACT)

    # Fillet1 of CirPattern3
    fillet1_of_cirpattern3_edges = [part.edges().sort_by_distance(p)[0] for p in [
        (71.714853001, 44.405993248, -7.483518341),
        (71.714853001, 13.938219338, -7.483518341),
        (29.646103001, 13.938219338, 65.38169407),
        (29.646103001, 44.405993248, 65.38169407),
        (-42.338343494, 44.405993248, -58.365125357),
        (-42.338343494, 13.938219338, -58.365125357),
        (41.799156506, 13.938219338, -58.365125357),
        (41.799156506, 44.405993248, -58.365125357),
    ]]
    fillet(fillet1_of_cirpattern3_edges, radius=FILLET1_OF_CIRPATTERN3_R)

    # Sketch8 → Cut-Extrude2 (cut)
    with BuildSketch(Plane(origin=(0, 0, 0), x_dir=(-1, 0, 0), z_dir=(0, -1, 0))):
        with Locations(Location((63.5, -38.222388871, 0), (0, 0, 90))):
            Circle(SKETCH8_R)
        with Locations(Location((38.1, -63.622388871, 0), (0, 0, 90))):
            Circle(SKETCH8_R)
        with Locations(Location((-63.5, -38.222388871, 0), (0, 0, 270))):
            Circle(SKETCH8_R)
        with Locations(Location((-38.1, -63.622388871, 0), (0, 0, 270))):
            Circle(SKETCH8_R)
        with Locations(Location((63.5, 37.977611129, 0), (0, 0, 90))):
            Circle(SKETCH8_R)
        with Locations(Location((38.1, 63.377611129, 0), (0, 0, 90))):
            Circle(SKETCH8_R)
        with Locations(Location((-38.1, 63.377611129, 0), (0, 0, 90))):
            Circle(SKETCH8_R)
        with Locations(Location((-63.5, 37.977611129, 0), (0, 0, 90))):
            Circle(SKETCH8_R)
    extrude(amount=-CUT_EXTRUDE2_DEPTH, mode=Mode.SUBTRACT)

    # Sketch9 → Cut-Extrude4 (cut, through all)
    with BuildSketch(Plane(origin=(0, 8.466666667, 0), x_dir=(1, 0, 0), z_dir=(0, 1, 0))):
        with Locations(Location((0, 0, 0), (0, 0, 270))):
            Circle(SKETCH9_R)
    extrude(amount=-CUT_EXTRUDE4_DEPTH, mode=Mode.SUBTRACT)


solid = part.part
